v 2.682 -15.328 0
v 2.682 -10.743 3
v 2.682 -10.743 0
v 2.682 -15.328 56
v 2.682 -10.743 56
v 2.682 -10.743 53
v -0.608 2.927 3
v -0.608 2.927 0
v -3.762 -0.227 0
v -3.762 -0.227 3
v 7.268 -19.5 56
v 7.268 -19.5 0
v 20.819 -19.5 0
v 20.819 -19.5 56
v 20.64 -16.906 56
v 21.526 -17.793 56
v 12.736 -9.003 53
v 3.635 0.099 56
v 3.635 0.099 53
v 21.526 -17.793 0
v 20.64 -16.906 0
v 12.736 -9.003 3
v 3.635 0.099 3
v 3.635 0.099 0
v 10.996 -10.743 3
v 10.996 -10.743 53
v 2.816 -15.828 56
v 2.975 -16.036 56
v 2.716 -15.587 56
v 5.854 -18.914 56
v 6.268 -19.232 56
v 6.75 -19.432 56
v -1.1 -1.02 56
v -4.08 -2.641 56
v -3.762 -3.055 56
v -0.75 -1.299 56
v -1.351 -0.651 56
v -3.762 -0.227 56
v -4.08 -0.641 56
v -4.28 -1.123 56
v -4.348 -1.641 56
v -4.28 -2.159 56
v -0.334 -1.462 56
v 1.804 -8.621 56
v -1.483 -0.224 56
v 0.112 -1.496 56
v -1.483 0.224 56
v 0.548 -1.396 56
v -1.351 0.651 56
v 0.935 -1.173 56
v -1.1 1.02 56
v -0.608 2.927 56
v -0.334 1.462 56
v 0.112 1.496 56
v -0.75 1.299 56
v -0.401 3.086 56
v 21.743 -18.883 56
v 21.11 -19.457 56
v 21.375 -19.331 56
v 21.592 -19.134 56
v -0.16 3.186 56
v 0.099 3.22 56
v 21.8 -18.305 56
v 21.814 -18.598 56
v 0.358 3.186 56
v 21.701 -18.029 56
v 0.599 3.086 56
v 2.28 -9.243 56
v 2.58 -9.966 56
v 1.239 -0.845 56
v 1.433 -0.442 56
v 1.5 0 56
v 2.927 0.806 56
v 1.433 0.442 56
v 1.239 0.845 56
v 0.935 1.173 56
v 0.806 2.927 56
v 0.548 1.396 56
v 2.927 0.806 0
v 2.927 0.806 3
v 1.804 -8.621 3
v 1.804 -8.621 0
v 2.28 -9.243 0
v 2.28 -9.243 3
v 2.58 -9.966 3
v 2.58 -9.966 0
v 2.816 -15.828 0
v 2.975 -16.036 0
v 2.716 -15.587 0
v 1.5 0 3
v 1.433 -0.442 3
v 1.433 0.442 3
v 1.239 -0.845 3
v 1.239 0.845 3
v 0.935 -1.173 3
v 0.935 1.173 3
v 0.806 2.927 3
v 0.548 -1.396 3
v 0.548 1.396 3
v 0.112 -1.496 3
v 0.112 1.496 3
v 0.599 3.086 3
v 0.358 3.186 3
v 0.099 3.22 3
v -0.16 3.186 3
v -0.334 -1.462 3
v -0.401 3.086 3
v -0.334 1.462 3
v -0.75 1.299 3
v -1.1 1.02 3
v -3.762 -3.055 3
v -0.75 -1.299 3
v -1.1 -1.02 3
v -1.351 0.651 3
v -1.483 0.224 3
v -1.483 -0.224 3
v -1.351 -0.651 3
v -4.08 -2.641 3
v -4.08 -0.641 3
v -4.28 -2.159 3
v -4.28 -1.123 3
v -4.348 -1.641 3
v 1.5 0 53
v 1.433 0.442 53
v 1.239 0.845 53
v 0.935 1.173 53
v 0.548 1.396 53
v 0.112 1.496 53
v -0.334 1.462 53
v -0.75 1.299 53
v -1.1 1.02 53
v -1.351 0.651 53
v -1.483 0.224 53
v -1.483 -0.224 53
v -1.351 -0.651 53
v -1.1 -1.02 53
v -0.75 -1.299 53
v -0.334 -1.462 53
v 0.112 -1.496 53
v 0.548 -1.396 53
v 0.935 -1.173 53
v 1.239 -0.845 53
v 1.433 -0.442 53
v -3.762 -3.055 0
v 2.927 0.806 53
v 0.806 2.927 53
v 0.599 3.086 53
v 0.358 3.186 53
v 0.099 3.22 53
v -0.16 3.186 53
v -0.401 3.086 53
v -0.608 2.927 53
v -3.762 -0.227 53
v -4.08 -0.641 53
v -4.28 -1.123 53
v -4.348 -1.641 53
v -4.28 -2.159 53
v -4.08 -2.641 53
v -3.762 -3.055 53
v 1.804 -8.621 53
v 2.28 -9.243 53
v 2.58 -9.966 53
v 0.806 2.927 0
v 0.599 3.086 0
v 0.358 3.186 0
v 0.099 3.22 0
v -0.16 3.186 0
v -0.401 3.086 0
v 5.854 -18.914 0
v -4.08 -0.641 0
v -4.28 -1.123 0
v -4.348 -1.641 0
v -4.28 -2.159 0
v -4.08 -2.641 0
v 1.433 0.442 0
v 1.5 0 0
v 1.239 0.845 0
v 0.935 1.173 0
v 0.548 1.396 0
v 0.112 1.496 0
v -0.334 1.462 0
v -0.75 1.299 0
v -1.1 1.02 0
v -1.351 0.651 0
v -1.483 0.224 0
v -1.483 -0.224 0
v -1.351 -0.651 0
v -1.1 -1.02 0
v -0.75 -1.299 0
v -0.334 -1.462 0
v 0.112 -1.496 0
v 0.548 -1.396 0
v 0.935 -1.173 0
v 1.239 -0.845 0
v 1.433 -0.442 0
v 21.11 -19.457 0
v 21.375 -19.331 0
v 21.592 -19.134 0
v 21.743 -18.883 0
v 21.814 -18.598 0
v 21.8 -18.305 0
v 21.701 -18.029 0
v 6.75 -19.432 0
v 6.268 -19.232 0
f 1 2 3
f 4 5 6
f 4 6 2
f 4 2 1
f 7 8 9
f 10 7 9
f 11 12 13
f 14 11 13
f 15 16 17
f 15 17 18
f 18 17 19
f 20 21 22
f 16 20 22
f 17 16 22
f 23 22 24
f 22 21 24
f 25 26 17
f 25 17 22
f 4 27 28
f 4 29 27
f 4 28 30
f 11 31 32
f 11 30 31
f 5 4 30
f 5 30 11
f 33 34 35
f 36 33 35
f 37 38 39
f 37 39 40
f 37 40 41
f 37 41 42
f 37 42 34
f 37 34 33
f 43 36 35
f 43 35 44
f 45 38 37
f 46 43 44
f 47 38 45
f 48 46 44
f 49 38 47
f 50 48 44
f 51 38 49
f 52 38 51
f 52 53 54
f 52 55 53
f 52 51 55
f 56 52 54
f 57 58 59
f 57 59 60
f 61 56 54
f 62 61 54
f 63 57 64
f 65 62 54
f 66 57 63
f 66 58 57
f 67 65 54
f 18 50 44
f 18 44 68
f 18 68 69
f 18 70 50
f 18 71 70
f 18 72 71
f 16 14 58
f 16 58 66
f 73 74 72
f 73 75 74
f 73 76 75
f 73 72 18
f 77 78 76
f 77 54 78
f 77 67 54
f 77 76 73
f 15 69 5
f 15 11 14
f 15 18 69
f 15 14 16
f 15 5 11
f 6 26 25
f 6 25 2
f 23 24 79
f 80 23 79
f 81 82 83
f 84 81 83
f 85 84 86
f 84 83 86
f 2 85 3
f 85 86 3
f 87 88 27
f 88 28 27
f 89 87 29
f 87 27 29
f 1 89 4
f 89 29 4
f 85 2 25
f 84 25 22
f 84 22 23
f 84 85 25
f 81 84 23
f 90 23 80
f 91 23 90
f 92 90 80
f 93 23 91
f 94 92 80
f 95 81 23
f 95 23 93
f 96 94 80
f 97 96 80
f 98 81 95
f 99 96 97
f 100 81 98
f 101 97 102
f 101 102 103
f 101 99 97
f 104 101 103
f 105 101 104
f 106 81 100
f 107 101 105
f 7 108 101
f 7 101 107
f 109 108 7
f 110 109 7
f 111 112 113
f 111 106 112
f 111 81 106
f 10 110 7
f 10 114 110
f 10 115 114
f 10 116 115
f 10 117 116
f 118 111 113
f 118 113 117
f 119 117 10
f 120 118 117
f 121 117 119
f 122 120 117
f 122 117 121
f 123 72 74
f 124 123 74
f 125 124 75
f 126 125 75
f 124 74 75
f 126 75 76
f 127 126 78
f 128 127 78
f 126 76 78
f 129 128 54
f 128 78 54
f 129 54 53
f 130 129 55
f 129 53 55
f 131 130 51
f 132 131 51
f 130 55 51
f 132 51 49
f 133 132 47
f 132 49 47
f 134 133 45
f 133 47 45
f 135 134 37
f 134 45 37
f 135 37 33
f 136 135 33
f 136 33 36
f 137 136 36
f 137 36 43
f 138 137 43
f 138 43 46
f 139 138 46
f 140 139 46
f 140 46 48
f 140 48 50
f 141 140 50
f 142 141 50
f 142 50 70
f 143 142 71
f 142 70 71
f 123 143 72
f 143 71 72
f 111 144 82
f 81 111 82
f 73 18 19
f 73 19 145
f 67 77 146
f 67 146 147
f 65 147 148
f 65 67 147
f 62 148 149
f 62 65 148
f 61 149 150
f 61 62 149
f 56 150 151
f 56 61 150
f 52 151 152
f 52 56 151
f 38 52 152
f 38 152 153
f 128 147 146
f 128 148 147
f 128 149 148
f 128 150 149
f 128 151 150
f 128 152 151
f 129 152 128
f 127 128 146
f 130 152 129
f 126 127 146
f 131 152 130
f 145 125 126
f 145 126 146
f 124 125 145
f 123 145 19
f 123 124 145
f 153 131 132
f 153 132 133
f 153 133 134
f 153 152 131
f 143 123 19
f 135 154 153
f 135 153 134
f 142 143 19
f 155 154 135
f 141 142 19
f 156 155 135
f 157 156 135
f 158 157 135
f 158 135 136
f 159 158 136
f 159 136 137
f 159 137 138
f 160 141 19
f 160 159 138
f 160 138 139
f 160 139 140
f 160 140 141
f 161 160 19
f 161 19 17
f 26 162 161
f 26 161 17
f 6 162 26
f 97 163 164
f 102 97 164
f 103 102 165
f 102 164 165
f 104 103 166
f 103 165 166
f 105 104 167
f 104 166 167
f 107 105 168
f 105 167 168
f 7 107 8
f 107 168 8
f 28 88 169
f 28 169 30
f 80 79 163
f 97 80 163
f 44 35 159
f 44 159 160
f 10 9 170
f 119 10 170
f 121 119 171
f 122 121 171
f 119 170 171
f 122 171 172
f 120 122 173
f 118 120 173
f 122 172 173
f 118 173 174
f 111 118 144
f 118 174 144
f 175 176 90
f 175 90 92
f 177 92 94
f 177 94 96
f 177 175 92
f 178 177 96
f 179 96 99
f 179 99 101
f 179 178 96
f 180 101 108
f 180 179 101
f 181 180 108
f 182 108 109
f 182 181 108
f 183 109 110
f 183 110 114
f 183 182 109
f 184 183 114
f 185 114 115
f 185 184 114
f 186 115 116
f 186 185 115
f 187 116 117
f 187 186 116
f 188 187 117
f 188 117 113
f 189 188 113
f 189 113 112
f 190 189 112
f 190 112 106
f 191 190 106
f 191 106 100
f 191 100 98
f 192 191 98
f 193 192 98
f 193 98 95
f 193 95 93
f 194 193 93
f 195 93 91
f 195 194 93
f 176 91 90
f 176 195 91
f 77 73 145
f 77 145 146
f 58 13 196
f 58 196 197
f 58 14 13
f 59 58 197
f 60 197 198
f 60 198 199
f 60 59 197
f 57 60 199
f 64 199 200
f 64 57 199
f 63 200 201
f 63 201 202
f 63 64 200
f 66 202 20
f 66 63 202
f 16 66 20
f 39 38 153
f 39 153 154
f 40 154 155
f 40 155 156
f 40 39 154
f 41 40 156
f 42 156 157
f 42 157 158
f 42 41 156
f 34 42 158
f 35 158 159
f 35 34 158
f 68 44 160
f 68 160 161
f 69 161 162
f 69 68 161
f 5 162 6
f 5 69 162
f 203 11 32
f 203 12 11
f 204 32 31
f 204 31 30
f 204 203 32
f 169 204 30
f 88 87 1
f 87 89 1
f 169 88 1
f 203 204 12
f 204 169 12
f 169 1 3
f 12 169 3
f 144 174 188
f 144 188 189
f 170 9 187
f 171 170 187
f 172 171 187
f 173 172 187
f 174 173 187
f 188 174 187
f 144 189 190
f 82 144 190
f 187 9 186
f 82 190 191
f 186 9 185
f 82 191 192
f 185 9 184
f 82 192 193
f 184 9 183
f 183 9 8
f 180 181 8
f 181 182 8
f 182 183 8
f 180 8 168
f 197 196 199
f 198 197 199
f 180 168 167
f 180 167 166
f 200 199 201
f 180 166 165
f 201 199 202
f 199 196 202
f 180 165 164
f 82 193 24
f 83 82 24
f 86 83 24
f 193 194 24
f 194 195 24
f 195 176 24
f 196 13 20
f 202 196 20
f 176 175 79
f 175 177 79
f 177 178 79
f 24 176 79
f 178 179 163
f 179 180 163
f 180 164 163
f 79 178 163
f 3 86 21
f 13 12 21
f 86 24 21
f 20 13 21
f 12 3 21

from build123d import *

# Parameters (mm, degrees)
SKETCH1_R           = 1.5
BOSS_EXTRUDE1_DEPTH = 3
BOSS_EXTRUDE2_DEPTH = 25
SKETCH6_W           = 56
SKETCH6_H           = 9.11547301
CUT_EXTRUDE1_DEPTH  = 63.91555103
FILLET1_R           = 2
FILLET2_R           = 1
BOSS_EXTRUDE4_DEPTH = 2.460910909
BOSS_EXTRUDE5_DEPTH = 56
FILLET3_R           = 1


with BuildPart() as part:
    # Sketch1 → Boss-Extrude1 (new body)
    with BuildSketch(Plane.XY):
        with BuildLine():
            ThreePointArc((2.68220241, -18.5), (2.975095629, -19.207106781), (3.68220241, -19.5))
            Line((3.68220241, -19.5), (18.54616344, -19.5))
            ThreePointArc((18.54616344, -19.5), (19.008103207, -19.191341716), (18.899716831, -18.646446609))
            Line((18.899716831, -18.646446609), (15.000000504, -14.746730282))
            Line((15.000000504, -14.746730282), (2.601508845, -2.348238623))
            Line((2.601508845, -2.348238623), (1.894402064, -1.641131842))
            Line((1.894402064, -1.641131842), (2.601508845, -0.934025061))
            Line((2.601508845, -0.934025061), (2.927422074, -0.608111832))
            Line((2.927422074, -0.608111832), (3.634528855, 0.098994949))
            Line((3.634528855, 0.098994949), (2.927422074, 0.806101731))
            Line((2.927422074, 0.806101731), (0.806101731, 2.927422074))
            ThreePointArc((0.806101731, 2.927422074), (0.098994949, 3.220315293), (-0.608111832, 2.927422074))
            Line((-0.608111832, 2.927422074), (-1.641131842, 1.894402064))
            Line((-1.641131842, 1.894402064), (-3.762452186, -0.22691828))
            ThreePointArc((-3.762452186, -0.22691828), (-4.348238623, -1.641131842), (-3.762452186, -3.055345405))
            Line((-3.762452186, -3.055345405), (1.803522753, -8.621320344))
            ThreePointArc((1.803522753, -8.621320344), (2.453841007, -9.59459039), (2.68220241, -10.742640687))
            Line((2.68220241, -10.742640687), (2.68220241, -18.5))
        make_face()
        Circle(SKETCH1_R, mode=Mode.SUBTRACT)
    boss_extrude1 = extrude(amount=BOSS_EXTRUDE1_DEPTH)

    # Sketch2 → Boss-Extrude2 (add)
    with BuildSketch(Plane.XY.offset(3)):
        with BuildLine():
            Line((18.899716831, -18.646446609), (10.995910909, -10.742640687))
            Line((10.995910909, -10.742640687), (2.68220241, -10.742640687))
            Line((2.68220241, -10.742640687), (2.68220241, -18.5))
            ThreePointArc((2.68220241, -18.5), (2.975095629, -19.207106781), (3.68220241, -19.5))
            Line((3.68220241, -19.5), (18.54616344, -19.5))
            ThreePointArc((18.54616344, -19.5), (19.008103207, -19.191341716), (18.899716831, -18.646446609))
        make_face()
    boss_extrude2 = extrude(amount=BOSS_EXTRUDE2_DEPTH)

    # Mirror1: Boss-Extrude1, Boss-Extrude2 across plane
    add(boss_extrude1.mirror(Plane.XY.offset(28)))
    add(boss_extrude2.mirror(Plane.XY.offset(28)))

    # Sketch6 → Cut-Extrude1 (cut, through all)
    with BuildSketch(Plane(origin=(-6.530219139, -6.530219139, 0), x_dir=(0, 0, 1), z_dir=(-0.7071067811865487, -0.7071067811865465, 0))):
        with Locations((28, -17.586068001)):
            Rectangle(SKETCH6_W, SKETCH6_H)
    extrude(amount=CUT_EXTRUDE1_DEPTH, mode=Mode.SUBTRACT)

    # Fillet1
    fillet1_edges = [part.edges().sort_by_distance(p)[0] for p in [
        (6.439561723, -19.5, 28),
    ]]
    fillet(fillet1_edges, radius=FILLET1_R)

    # Fillet2
    fillet2_edges = [part.edges().sort_by_distance(p)[0] for p in [
        (2.68220241, -15.742640687, 28),
    ]]
    fillet(fillet2_edges, radius=FILLET2_R)

    # Sketch9 → Boss-Extrude4 (add)
    with BuildSketch(Plane(origin=(0.126635111, 0.126635111, 0), x_dir=(0, 0, -1), z_dir=(0.7071067811865487, 0.7071067811865465, 0))):
        Polygon((-56, -2.5), (-53, -2.5), (-53, -15.371477247), (-3, -15.371477247), (-3, -2.5), (0, -2.5), (0, -26.549146776), (-56, -26.549146776), align=None)
    extrude(amount=BOSS_EXTRUDE4_DEPTH)

    # Sketch10 → Boss-Extrude5 (add)
    with BuildSketch(Plane(origin=(0, 0, 0), x_dir=(-1, 0, 0), z_dir=(0, 0, -1))):
        Polygon((-20.639843623, -16.906319818), (-18.04616344, -19.5), (-23.233523805, -19.5), align=None)
    extrude(amount=-BOSS_EXTRUDE5_DEPTH)

    # Fillet3
    fillet3_edges = [part.edges().sort_by_distance(p)[0] for p in [
        (23.233523805, -19.5, 28),
    ]]
    fillet(fillet3_edges, radius=FILLET3_R)


solid = part.part
